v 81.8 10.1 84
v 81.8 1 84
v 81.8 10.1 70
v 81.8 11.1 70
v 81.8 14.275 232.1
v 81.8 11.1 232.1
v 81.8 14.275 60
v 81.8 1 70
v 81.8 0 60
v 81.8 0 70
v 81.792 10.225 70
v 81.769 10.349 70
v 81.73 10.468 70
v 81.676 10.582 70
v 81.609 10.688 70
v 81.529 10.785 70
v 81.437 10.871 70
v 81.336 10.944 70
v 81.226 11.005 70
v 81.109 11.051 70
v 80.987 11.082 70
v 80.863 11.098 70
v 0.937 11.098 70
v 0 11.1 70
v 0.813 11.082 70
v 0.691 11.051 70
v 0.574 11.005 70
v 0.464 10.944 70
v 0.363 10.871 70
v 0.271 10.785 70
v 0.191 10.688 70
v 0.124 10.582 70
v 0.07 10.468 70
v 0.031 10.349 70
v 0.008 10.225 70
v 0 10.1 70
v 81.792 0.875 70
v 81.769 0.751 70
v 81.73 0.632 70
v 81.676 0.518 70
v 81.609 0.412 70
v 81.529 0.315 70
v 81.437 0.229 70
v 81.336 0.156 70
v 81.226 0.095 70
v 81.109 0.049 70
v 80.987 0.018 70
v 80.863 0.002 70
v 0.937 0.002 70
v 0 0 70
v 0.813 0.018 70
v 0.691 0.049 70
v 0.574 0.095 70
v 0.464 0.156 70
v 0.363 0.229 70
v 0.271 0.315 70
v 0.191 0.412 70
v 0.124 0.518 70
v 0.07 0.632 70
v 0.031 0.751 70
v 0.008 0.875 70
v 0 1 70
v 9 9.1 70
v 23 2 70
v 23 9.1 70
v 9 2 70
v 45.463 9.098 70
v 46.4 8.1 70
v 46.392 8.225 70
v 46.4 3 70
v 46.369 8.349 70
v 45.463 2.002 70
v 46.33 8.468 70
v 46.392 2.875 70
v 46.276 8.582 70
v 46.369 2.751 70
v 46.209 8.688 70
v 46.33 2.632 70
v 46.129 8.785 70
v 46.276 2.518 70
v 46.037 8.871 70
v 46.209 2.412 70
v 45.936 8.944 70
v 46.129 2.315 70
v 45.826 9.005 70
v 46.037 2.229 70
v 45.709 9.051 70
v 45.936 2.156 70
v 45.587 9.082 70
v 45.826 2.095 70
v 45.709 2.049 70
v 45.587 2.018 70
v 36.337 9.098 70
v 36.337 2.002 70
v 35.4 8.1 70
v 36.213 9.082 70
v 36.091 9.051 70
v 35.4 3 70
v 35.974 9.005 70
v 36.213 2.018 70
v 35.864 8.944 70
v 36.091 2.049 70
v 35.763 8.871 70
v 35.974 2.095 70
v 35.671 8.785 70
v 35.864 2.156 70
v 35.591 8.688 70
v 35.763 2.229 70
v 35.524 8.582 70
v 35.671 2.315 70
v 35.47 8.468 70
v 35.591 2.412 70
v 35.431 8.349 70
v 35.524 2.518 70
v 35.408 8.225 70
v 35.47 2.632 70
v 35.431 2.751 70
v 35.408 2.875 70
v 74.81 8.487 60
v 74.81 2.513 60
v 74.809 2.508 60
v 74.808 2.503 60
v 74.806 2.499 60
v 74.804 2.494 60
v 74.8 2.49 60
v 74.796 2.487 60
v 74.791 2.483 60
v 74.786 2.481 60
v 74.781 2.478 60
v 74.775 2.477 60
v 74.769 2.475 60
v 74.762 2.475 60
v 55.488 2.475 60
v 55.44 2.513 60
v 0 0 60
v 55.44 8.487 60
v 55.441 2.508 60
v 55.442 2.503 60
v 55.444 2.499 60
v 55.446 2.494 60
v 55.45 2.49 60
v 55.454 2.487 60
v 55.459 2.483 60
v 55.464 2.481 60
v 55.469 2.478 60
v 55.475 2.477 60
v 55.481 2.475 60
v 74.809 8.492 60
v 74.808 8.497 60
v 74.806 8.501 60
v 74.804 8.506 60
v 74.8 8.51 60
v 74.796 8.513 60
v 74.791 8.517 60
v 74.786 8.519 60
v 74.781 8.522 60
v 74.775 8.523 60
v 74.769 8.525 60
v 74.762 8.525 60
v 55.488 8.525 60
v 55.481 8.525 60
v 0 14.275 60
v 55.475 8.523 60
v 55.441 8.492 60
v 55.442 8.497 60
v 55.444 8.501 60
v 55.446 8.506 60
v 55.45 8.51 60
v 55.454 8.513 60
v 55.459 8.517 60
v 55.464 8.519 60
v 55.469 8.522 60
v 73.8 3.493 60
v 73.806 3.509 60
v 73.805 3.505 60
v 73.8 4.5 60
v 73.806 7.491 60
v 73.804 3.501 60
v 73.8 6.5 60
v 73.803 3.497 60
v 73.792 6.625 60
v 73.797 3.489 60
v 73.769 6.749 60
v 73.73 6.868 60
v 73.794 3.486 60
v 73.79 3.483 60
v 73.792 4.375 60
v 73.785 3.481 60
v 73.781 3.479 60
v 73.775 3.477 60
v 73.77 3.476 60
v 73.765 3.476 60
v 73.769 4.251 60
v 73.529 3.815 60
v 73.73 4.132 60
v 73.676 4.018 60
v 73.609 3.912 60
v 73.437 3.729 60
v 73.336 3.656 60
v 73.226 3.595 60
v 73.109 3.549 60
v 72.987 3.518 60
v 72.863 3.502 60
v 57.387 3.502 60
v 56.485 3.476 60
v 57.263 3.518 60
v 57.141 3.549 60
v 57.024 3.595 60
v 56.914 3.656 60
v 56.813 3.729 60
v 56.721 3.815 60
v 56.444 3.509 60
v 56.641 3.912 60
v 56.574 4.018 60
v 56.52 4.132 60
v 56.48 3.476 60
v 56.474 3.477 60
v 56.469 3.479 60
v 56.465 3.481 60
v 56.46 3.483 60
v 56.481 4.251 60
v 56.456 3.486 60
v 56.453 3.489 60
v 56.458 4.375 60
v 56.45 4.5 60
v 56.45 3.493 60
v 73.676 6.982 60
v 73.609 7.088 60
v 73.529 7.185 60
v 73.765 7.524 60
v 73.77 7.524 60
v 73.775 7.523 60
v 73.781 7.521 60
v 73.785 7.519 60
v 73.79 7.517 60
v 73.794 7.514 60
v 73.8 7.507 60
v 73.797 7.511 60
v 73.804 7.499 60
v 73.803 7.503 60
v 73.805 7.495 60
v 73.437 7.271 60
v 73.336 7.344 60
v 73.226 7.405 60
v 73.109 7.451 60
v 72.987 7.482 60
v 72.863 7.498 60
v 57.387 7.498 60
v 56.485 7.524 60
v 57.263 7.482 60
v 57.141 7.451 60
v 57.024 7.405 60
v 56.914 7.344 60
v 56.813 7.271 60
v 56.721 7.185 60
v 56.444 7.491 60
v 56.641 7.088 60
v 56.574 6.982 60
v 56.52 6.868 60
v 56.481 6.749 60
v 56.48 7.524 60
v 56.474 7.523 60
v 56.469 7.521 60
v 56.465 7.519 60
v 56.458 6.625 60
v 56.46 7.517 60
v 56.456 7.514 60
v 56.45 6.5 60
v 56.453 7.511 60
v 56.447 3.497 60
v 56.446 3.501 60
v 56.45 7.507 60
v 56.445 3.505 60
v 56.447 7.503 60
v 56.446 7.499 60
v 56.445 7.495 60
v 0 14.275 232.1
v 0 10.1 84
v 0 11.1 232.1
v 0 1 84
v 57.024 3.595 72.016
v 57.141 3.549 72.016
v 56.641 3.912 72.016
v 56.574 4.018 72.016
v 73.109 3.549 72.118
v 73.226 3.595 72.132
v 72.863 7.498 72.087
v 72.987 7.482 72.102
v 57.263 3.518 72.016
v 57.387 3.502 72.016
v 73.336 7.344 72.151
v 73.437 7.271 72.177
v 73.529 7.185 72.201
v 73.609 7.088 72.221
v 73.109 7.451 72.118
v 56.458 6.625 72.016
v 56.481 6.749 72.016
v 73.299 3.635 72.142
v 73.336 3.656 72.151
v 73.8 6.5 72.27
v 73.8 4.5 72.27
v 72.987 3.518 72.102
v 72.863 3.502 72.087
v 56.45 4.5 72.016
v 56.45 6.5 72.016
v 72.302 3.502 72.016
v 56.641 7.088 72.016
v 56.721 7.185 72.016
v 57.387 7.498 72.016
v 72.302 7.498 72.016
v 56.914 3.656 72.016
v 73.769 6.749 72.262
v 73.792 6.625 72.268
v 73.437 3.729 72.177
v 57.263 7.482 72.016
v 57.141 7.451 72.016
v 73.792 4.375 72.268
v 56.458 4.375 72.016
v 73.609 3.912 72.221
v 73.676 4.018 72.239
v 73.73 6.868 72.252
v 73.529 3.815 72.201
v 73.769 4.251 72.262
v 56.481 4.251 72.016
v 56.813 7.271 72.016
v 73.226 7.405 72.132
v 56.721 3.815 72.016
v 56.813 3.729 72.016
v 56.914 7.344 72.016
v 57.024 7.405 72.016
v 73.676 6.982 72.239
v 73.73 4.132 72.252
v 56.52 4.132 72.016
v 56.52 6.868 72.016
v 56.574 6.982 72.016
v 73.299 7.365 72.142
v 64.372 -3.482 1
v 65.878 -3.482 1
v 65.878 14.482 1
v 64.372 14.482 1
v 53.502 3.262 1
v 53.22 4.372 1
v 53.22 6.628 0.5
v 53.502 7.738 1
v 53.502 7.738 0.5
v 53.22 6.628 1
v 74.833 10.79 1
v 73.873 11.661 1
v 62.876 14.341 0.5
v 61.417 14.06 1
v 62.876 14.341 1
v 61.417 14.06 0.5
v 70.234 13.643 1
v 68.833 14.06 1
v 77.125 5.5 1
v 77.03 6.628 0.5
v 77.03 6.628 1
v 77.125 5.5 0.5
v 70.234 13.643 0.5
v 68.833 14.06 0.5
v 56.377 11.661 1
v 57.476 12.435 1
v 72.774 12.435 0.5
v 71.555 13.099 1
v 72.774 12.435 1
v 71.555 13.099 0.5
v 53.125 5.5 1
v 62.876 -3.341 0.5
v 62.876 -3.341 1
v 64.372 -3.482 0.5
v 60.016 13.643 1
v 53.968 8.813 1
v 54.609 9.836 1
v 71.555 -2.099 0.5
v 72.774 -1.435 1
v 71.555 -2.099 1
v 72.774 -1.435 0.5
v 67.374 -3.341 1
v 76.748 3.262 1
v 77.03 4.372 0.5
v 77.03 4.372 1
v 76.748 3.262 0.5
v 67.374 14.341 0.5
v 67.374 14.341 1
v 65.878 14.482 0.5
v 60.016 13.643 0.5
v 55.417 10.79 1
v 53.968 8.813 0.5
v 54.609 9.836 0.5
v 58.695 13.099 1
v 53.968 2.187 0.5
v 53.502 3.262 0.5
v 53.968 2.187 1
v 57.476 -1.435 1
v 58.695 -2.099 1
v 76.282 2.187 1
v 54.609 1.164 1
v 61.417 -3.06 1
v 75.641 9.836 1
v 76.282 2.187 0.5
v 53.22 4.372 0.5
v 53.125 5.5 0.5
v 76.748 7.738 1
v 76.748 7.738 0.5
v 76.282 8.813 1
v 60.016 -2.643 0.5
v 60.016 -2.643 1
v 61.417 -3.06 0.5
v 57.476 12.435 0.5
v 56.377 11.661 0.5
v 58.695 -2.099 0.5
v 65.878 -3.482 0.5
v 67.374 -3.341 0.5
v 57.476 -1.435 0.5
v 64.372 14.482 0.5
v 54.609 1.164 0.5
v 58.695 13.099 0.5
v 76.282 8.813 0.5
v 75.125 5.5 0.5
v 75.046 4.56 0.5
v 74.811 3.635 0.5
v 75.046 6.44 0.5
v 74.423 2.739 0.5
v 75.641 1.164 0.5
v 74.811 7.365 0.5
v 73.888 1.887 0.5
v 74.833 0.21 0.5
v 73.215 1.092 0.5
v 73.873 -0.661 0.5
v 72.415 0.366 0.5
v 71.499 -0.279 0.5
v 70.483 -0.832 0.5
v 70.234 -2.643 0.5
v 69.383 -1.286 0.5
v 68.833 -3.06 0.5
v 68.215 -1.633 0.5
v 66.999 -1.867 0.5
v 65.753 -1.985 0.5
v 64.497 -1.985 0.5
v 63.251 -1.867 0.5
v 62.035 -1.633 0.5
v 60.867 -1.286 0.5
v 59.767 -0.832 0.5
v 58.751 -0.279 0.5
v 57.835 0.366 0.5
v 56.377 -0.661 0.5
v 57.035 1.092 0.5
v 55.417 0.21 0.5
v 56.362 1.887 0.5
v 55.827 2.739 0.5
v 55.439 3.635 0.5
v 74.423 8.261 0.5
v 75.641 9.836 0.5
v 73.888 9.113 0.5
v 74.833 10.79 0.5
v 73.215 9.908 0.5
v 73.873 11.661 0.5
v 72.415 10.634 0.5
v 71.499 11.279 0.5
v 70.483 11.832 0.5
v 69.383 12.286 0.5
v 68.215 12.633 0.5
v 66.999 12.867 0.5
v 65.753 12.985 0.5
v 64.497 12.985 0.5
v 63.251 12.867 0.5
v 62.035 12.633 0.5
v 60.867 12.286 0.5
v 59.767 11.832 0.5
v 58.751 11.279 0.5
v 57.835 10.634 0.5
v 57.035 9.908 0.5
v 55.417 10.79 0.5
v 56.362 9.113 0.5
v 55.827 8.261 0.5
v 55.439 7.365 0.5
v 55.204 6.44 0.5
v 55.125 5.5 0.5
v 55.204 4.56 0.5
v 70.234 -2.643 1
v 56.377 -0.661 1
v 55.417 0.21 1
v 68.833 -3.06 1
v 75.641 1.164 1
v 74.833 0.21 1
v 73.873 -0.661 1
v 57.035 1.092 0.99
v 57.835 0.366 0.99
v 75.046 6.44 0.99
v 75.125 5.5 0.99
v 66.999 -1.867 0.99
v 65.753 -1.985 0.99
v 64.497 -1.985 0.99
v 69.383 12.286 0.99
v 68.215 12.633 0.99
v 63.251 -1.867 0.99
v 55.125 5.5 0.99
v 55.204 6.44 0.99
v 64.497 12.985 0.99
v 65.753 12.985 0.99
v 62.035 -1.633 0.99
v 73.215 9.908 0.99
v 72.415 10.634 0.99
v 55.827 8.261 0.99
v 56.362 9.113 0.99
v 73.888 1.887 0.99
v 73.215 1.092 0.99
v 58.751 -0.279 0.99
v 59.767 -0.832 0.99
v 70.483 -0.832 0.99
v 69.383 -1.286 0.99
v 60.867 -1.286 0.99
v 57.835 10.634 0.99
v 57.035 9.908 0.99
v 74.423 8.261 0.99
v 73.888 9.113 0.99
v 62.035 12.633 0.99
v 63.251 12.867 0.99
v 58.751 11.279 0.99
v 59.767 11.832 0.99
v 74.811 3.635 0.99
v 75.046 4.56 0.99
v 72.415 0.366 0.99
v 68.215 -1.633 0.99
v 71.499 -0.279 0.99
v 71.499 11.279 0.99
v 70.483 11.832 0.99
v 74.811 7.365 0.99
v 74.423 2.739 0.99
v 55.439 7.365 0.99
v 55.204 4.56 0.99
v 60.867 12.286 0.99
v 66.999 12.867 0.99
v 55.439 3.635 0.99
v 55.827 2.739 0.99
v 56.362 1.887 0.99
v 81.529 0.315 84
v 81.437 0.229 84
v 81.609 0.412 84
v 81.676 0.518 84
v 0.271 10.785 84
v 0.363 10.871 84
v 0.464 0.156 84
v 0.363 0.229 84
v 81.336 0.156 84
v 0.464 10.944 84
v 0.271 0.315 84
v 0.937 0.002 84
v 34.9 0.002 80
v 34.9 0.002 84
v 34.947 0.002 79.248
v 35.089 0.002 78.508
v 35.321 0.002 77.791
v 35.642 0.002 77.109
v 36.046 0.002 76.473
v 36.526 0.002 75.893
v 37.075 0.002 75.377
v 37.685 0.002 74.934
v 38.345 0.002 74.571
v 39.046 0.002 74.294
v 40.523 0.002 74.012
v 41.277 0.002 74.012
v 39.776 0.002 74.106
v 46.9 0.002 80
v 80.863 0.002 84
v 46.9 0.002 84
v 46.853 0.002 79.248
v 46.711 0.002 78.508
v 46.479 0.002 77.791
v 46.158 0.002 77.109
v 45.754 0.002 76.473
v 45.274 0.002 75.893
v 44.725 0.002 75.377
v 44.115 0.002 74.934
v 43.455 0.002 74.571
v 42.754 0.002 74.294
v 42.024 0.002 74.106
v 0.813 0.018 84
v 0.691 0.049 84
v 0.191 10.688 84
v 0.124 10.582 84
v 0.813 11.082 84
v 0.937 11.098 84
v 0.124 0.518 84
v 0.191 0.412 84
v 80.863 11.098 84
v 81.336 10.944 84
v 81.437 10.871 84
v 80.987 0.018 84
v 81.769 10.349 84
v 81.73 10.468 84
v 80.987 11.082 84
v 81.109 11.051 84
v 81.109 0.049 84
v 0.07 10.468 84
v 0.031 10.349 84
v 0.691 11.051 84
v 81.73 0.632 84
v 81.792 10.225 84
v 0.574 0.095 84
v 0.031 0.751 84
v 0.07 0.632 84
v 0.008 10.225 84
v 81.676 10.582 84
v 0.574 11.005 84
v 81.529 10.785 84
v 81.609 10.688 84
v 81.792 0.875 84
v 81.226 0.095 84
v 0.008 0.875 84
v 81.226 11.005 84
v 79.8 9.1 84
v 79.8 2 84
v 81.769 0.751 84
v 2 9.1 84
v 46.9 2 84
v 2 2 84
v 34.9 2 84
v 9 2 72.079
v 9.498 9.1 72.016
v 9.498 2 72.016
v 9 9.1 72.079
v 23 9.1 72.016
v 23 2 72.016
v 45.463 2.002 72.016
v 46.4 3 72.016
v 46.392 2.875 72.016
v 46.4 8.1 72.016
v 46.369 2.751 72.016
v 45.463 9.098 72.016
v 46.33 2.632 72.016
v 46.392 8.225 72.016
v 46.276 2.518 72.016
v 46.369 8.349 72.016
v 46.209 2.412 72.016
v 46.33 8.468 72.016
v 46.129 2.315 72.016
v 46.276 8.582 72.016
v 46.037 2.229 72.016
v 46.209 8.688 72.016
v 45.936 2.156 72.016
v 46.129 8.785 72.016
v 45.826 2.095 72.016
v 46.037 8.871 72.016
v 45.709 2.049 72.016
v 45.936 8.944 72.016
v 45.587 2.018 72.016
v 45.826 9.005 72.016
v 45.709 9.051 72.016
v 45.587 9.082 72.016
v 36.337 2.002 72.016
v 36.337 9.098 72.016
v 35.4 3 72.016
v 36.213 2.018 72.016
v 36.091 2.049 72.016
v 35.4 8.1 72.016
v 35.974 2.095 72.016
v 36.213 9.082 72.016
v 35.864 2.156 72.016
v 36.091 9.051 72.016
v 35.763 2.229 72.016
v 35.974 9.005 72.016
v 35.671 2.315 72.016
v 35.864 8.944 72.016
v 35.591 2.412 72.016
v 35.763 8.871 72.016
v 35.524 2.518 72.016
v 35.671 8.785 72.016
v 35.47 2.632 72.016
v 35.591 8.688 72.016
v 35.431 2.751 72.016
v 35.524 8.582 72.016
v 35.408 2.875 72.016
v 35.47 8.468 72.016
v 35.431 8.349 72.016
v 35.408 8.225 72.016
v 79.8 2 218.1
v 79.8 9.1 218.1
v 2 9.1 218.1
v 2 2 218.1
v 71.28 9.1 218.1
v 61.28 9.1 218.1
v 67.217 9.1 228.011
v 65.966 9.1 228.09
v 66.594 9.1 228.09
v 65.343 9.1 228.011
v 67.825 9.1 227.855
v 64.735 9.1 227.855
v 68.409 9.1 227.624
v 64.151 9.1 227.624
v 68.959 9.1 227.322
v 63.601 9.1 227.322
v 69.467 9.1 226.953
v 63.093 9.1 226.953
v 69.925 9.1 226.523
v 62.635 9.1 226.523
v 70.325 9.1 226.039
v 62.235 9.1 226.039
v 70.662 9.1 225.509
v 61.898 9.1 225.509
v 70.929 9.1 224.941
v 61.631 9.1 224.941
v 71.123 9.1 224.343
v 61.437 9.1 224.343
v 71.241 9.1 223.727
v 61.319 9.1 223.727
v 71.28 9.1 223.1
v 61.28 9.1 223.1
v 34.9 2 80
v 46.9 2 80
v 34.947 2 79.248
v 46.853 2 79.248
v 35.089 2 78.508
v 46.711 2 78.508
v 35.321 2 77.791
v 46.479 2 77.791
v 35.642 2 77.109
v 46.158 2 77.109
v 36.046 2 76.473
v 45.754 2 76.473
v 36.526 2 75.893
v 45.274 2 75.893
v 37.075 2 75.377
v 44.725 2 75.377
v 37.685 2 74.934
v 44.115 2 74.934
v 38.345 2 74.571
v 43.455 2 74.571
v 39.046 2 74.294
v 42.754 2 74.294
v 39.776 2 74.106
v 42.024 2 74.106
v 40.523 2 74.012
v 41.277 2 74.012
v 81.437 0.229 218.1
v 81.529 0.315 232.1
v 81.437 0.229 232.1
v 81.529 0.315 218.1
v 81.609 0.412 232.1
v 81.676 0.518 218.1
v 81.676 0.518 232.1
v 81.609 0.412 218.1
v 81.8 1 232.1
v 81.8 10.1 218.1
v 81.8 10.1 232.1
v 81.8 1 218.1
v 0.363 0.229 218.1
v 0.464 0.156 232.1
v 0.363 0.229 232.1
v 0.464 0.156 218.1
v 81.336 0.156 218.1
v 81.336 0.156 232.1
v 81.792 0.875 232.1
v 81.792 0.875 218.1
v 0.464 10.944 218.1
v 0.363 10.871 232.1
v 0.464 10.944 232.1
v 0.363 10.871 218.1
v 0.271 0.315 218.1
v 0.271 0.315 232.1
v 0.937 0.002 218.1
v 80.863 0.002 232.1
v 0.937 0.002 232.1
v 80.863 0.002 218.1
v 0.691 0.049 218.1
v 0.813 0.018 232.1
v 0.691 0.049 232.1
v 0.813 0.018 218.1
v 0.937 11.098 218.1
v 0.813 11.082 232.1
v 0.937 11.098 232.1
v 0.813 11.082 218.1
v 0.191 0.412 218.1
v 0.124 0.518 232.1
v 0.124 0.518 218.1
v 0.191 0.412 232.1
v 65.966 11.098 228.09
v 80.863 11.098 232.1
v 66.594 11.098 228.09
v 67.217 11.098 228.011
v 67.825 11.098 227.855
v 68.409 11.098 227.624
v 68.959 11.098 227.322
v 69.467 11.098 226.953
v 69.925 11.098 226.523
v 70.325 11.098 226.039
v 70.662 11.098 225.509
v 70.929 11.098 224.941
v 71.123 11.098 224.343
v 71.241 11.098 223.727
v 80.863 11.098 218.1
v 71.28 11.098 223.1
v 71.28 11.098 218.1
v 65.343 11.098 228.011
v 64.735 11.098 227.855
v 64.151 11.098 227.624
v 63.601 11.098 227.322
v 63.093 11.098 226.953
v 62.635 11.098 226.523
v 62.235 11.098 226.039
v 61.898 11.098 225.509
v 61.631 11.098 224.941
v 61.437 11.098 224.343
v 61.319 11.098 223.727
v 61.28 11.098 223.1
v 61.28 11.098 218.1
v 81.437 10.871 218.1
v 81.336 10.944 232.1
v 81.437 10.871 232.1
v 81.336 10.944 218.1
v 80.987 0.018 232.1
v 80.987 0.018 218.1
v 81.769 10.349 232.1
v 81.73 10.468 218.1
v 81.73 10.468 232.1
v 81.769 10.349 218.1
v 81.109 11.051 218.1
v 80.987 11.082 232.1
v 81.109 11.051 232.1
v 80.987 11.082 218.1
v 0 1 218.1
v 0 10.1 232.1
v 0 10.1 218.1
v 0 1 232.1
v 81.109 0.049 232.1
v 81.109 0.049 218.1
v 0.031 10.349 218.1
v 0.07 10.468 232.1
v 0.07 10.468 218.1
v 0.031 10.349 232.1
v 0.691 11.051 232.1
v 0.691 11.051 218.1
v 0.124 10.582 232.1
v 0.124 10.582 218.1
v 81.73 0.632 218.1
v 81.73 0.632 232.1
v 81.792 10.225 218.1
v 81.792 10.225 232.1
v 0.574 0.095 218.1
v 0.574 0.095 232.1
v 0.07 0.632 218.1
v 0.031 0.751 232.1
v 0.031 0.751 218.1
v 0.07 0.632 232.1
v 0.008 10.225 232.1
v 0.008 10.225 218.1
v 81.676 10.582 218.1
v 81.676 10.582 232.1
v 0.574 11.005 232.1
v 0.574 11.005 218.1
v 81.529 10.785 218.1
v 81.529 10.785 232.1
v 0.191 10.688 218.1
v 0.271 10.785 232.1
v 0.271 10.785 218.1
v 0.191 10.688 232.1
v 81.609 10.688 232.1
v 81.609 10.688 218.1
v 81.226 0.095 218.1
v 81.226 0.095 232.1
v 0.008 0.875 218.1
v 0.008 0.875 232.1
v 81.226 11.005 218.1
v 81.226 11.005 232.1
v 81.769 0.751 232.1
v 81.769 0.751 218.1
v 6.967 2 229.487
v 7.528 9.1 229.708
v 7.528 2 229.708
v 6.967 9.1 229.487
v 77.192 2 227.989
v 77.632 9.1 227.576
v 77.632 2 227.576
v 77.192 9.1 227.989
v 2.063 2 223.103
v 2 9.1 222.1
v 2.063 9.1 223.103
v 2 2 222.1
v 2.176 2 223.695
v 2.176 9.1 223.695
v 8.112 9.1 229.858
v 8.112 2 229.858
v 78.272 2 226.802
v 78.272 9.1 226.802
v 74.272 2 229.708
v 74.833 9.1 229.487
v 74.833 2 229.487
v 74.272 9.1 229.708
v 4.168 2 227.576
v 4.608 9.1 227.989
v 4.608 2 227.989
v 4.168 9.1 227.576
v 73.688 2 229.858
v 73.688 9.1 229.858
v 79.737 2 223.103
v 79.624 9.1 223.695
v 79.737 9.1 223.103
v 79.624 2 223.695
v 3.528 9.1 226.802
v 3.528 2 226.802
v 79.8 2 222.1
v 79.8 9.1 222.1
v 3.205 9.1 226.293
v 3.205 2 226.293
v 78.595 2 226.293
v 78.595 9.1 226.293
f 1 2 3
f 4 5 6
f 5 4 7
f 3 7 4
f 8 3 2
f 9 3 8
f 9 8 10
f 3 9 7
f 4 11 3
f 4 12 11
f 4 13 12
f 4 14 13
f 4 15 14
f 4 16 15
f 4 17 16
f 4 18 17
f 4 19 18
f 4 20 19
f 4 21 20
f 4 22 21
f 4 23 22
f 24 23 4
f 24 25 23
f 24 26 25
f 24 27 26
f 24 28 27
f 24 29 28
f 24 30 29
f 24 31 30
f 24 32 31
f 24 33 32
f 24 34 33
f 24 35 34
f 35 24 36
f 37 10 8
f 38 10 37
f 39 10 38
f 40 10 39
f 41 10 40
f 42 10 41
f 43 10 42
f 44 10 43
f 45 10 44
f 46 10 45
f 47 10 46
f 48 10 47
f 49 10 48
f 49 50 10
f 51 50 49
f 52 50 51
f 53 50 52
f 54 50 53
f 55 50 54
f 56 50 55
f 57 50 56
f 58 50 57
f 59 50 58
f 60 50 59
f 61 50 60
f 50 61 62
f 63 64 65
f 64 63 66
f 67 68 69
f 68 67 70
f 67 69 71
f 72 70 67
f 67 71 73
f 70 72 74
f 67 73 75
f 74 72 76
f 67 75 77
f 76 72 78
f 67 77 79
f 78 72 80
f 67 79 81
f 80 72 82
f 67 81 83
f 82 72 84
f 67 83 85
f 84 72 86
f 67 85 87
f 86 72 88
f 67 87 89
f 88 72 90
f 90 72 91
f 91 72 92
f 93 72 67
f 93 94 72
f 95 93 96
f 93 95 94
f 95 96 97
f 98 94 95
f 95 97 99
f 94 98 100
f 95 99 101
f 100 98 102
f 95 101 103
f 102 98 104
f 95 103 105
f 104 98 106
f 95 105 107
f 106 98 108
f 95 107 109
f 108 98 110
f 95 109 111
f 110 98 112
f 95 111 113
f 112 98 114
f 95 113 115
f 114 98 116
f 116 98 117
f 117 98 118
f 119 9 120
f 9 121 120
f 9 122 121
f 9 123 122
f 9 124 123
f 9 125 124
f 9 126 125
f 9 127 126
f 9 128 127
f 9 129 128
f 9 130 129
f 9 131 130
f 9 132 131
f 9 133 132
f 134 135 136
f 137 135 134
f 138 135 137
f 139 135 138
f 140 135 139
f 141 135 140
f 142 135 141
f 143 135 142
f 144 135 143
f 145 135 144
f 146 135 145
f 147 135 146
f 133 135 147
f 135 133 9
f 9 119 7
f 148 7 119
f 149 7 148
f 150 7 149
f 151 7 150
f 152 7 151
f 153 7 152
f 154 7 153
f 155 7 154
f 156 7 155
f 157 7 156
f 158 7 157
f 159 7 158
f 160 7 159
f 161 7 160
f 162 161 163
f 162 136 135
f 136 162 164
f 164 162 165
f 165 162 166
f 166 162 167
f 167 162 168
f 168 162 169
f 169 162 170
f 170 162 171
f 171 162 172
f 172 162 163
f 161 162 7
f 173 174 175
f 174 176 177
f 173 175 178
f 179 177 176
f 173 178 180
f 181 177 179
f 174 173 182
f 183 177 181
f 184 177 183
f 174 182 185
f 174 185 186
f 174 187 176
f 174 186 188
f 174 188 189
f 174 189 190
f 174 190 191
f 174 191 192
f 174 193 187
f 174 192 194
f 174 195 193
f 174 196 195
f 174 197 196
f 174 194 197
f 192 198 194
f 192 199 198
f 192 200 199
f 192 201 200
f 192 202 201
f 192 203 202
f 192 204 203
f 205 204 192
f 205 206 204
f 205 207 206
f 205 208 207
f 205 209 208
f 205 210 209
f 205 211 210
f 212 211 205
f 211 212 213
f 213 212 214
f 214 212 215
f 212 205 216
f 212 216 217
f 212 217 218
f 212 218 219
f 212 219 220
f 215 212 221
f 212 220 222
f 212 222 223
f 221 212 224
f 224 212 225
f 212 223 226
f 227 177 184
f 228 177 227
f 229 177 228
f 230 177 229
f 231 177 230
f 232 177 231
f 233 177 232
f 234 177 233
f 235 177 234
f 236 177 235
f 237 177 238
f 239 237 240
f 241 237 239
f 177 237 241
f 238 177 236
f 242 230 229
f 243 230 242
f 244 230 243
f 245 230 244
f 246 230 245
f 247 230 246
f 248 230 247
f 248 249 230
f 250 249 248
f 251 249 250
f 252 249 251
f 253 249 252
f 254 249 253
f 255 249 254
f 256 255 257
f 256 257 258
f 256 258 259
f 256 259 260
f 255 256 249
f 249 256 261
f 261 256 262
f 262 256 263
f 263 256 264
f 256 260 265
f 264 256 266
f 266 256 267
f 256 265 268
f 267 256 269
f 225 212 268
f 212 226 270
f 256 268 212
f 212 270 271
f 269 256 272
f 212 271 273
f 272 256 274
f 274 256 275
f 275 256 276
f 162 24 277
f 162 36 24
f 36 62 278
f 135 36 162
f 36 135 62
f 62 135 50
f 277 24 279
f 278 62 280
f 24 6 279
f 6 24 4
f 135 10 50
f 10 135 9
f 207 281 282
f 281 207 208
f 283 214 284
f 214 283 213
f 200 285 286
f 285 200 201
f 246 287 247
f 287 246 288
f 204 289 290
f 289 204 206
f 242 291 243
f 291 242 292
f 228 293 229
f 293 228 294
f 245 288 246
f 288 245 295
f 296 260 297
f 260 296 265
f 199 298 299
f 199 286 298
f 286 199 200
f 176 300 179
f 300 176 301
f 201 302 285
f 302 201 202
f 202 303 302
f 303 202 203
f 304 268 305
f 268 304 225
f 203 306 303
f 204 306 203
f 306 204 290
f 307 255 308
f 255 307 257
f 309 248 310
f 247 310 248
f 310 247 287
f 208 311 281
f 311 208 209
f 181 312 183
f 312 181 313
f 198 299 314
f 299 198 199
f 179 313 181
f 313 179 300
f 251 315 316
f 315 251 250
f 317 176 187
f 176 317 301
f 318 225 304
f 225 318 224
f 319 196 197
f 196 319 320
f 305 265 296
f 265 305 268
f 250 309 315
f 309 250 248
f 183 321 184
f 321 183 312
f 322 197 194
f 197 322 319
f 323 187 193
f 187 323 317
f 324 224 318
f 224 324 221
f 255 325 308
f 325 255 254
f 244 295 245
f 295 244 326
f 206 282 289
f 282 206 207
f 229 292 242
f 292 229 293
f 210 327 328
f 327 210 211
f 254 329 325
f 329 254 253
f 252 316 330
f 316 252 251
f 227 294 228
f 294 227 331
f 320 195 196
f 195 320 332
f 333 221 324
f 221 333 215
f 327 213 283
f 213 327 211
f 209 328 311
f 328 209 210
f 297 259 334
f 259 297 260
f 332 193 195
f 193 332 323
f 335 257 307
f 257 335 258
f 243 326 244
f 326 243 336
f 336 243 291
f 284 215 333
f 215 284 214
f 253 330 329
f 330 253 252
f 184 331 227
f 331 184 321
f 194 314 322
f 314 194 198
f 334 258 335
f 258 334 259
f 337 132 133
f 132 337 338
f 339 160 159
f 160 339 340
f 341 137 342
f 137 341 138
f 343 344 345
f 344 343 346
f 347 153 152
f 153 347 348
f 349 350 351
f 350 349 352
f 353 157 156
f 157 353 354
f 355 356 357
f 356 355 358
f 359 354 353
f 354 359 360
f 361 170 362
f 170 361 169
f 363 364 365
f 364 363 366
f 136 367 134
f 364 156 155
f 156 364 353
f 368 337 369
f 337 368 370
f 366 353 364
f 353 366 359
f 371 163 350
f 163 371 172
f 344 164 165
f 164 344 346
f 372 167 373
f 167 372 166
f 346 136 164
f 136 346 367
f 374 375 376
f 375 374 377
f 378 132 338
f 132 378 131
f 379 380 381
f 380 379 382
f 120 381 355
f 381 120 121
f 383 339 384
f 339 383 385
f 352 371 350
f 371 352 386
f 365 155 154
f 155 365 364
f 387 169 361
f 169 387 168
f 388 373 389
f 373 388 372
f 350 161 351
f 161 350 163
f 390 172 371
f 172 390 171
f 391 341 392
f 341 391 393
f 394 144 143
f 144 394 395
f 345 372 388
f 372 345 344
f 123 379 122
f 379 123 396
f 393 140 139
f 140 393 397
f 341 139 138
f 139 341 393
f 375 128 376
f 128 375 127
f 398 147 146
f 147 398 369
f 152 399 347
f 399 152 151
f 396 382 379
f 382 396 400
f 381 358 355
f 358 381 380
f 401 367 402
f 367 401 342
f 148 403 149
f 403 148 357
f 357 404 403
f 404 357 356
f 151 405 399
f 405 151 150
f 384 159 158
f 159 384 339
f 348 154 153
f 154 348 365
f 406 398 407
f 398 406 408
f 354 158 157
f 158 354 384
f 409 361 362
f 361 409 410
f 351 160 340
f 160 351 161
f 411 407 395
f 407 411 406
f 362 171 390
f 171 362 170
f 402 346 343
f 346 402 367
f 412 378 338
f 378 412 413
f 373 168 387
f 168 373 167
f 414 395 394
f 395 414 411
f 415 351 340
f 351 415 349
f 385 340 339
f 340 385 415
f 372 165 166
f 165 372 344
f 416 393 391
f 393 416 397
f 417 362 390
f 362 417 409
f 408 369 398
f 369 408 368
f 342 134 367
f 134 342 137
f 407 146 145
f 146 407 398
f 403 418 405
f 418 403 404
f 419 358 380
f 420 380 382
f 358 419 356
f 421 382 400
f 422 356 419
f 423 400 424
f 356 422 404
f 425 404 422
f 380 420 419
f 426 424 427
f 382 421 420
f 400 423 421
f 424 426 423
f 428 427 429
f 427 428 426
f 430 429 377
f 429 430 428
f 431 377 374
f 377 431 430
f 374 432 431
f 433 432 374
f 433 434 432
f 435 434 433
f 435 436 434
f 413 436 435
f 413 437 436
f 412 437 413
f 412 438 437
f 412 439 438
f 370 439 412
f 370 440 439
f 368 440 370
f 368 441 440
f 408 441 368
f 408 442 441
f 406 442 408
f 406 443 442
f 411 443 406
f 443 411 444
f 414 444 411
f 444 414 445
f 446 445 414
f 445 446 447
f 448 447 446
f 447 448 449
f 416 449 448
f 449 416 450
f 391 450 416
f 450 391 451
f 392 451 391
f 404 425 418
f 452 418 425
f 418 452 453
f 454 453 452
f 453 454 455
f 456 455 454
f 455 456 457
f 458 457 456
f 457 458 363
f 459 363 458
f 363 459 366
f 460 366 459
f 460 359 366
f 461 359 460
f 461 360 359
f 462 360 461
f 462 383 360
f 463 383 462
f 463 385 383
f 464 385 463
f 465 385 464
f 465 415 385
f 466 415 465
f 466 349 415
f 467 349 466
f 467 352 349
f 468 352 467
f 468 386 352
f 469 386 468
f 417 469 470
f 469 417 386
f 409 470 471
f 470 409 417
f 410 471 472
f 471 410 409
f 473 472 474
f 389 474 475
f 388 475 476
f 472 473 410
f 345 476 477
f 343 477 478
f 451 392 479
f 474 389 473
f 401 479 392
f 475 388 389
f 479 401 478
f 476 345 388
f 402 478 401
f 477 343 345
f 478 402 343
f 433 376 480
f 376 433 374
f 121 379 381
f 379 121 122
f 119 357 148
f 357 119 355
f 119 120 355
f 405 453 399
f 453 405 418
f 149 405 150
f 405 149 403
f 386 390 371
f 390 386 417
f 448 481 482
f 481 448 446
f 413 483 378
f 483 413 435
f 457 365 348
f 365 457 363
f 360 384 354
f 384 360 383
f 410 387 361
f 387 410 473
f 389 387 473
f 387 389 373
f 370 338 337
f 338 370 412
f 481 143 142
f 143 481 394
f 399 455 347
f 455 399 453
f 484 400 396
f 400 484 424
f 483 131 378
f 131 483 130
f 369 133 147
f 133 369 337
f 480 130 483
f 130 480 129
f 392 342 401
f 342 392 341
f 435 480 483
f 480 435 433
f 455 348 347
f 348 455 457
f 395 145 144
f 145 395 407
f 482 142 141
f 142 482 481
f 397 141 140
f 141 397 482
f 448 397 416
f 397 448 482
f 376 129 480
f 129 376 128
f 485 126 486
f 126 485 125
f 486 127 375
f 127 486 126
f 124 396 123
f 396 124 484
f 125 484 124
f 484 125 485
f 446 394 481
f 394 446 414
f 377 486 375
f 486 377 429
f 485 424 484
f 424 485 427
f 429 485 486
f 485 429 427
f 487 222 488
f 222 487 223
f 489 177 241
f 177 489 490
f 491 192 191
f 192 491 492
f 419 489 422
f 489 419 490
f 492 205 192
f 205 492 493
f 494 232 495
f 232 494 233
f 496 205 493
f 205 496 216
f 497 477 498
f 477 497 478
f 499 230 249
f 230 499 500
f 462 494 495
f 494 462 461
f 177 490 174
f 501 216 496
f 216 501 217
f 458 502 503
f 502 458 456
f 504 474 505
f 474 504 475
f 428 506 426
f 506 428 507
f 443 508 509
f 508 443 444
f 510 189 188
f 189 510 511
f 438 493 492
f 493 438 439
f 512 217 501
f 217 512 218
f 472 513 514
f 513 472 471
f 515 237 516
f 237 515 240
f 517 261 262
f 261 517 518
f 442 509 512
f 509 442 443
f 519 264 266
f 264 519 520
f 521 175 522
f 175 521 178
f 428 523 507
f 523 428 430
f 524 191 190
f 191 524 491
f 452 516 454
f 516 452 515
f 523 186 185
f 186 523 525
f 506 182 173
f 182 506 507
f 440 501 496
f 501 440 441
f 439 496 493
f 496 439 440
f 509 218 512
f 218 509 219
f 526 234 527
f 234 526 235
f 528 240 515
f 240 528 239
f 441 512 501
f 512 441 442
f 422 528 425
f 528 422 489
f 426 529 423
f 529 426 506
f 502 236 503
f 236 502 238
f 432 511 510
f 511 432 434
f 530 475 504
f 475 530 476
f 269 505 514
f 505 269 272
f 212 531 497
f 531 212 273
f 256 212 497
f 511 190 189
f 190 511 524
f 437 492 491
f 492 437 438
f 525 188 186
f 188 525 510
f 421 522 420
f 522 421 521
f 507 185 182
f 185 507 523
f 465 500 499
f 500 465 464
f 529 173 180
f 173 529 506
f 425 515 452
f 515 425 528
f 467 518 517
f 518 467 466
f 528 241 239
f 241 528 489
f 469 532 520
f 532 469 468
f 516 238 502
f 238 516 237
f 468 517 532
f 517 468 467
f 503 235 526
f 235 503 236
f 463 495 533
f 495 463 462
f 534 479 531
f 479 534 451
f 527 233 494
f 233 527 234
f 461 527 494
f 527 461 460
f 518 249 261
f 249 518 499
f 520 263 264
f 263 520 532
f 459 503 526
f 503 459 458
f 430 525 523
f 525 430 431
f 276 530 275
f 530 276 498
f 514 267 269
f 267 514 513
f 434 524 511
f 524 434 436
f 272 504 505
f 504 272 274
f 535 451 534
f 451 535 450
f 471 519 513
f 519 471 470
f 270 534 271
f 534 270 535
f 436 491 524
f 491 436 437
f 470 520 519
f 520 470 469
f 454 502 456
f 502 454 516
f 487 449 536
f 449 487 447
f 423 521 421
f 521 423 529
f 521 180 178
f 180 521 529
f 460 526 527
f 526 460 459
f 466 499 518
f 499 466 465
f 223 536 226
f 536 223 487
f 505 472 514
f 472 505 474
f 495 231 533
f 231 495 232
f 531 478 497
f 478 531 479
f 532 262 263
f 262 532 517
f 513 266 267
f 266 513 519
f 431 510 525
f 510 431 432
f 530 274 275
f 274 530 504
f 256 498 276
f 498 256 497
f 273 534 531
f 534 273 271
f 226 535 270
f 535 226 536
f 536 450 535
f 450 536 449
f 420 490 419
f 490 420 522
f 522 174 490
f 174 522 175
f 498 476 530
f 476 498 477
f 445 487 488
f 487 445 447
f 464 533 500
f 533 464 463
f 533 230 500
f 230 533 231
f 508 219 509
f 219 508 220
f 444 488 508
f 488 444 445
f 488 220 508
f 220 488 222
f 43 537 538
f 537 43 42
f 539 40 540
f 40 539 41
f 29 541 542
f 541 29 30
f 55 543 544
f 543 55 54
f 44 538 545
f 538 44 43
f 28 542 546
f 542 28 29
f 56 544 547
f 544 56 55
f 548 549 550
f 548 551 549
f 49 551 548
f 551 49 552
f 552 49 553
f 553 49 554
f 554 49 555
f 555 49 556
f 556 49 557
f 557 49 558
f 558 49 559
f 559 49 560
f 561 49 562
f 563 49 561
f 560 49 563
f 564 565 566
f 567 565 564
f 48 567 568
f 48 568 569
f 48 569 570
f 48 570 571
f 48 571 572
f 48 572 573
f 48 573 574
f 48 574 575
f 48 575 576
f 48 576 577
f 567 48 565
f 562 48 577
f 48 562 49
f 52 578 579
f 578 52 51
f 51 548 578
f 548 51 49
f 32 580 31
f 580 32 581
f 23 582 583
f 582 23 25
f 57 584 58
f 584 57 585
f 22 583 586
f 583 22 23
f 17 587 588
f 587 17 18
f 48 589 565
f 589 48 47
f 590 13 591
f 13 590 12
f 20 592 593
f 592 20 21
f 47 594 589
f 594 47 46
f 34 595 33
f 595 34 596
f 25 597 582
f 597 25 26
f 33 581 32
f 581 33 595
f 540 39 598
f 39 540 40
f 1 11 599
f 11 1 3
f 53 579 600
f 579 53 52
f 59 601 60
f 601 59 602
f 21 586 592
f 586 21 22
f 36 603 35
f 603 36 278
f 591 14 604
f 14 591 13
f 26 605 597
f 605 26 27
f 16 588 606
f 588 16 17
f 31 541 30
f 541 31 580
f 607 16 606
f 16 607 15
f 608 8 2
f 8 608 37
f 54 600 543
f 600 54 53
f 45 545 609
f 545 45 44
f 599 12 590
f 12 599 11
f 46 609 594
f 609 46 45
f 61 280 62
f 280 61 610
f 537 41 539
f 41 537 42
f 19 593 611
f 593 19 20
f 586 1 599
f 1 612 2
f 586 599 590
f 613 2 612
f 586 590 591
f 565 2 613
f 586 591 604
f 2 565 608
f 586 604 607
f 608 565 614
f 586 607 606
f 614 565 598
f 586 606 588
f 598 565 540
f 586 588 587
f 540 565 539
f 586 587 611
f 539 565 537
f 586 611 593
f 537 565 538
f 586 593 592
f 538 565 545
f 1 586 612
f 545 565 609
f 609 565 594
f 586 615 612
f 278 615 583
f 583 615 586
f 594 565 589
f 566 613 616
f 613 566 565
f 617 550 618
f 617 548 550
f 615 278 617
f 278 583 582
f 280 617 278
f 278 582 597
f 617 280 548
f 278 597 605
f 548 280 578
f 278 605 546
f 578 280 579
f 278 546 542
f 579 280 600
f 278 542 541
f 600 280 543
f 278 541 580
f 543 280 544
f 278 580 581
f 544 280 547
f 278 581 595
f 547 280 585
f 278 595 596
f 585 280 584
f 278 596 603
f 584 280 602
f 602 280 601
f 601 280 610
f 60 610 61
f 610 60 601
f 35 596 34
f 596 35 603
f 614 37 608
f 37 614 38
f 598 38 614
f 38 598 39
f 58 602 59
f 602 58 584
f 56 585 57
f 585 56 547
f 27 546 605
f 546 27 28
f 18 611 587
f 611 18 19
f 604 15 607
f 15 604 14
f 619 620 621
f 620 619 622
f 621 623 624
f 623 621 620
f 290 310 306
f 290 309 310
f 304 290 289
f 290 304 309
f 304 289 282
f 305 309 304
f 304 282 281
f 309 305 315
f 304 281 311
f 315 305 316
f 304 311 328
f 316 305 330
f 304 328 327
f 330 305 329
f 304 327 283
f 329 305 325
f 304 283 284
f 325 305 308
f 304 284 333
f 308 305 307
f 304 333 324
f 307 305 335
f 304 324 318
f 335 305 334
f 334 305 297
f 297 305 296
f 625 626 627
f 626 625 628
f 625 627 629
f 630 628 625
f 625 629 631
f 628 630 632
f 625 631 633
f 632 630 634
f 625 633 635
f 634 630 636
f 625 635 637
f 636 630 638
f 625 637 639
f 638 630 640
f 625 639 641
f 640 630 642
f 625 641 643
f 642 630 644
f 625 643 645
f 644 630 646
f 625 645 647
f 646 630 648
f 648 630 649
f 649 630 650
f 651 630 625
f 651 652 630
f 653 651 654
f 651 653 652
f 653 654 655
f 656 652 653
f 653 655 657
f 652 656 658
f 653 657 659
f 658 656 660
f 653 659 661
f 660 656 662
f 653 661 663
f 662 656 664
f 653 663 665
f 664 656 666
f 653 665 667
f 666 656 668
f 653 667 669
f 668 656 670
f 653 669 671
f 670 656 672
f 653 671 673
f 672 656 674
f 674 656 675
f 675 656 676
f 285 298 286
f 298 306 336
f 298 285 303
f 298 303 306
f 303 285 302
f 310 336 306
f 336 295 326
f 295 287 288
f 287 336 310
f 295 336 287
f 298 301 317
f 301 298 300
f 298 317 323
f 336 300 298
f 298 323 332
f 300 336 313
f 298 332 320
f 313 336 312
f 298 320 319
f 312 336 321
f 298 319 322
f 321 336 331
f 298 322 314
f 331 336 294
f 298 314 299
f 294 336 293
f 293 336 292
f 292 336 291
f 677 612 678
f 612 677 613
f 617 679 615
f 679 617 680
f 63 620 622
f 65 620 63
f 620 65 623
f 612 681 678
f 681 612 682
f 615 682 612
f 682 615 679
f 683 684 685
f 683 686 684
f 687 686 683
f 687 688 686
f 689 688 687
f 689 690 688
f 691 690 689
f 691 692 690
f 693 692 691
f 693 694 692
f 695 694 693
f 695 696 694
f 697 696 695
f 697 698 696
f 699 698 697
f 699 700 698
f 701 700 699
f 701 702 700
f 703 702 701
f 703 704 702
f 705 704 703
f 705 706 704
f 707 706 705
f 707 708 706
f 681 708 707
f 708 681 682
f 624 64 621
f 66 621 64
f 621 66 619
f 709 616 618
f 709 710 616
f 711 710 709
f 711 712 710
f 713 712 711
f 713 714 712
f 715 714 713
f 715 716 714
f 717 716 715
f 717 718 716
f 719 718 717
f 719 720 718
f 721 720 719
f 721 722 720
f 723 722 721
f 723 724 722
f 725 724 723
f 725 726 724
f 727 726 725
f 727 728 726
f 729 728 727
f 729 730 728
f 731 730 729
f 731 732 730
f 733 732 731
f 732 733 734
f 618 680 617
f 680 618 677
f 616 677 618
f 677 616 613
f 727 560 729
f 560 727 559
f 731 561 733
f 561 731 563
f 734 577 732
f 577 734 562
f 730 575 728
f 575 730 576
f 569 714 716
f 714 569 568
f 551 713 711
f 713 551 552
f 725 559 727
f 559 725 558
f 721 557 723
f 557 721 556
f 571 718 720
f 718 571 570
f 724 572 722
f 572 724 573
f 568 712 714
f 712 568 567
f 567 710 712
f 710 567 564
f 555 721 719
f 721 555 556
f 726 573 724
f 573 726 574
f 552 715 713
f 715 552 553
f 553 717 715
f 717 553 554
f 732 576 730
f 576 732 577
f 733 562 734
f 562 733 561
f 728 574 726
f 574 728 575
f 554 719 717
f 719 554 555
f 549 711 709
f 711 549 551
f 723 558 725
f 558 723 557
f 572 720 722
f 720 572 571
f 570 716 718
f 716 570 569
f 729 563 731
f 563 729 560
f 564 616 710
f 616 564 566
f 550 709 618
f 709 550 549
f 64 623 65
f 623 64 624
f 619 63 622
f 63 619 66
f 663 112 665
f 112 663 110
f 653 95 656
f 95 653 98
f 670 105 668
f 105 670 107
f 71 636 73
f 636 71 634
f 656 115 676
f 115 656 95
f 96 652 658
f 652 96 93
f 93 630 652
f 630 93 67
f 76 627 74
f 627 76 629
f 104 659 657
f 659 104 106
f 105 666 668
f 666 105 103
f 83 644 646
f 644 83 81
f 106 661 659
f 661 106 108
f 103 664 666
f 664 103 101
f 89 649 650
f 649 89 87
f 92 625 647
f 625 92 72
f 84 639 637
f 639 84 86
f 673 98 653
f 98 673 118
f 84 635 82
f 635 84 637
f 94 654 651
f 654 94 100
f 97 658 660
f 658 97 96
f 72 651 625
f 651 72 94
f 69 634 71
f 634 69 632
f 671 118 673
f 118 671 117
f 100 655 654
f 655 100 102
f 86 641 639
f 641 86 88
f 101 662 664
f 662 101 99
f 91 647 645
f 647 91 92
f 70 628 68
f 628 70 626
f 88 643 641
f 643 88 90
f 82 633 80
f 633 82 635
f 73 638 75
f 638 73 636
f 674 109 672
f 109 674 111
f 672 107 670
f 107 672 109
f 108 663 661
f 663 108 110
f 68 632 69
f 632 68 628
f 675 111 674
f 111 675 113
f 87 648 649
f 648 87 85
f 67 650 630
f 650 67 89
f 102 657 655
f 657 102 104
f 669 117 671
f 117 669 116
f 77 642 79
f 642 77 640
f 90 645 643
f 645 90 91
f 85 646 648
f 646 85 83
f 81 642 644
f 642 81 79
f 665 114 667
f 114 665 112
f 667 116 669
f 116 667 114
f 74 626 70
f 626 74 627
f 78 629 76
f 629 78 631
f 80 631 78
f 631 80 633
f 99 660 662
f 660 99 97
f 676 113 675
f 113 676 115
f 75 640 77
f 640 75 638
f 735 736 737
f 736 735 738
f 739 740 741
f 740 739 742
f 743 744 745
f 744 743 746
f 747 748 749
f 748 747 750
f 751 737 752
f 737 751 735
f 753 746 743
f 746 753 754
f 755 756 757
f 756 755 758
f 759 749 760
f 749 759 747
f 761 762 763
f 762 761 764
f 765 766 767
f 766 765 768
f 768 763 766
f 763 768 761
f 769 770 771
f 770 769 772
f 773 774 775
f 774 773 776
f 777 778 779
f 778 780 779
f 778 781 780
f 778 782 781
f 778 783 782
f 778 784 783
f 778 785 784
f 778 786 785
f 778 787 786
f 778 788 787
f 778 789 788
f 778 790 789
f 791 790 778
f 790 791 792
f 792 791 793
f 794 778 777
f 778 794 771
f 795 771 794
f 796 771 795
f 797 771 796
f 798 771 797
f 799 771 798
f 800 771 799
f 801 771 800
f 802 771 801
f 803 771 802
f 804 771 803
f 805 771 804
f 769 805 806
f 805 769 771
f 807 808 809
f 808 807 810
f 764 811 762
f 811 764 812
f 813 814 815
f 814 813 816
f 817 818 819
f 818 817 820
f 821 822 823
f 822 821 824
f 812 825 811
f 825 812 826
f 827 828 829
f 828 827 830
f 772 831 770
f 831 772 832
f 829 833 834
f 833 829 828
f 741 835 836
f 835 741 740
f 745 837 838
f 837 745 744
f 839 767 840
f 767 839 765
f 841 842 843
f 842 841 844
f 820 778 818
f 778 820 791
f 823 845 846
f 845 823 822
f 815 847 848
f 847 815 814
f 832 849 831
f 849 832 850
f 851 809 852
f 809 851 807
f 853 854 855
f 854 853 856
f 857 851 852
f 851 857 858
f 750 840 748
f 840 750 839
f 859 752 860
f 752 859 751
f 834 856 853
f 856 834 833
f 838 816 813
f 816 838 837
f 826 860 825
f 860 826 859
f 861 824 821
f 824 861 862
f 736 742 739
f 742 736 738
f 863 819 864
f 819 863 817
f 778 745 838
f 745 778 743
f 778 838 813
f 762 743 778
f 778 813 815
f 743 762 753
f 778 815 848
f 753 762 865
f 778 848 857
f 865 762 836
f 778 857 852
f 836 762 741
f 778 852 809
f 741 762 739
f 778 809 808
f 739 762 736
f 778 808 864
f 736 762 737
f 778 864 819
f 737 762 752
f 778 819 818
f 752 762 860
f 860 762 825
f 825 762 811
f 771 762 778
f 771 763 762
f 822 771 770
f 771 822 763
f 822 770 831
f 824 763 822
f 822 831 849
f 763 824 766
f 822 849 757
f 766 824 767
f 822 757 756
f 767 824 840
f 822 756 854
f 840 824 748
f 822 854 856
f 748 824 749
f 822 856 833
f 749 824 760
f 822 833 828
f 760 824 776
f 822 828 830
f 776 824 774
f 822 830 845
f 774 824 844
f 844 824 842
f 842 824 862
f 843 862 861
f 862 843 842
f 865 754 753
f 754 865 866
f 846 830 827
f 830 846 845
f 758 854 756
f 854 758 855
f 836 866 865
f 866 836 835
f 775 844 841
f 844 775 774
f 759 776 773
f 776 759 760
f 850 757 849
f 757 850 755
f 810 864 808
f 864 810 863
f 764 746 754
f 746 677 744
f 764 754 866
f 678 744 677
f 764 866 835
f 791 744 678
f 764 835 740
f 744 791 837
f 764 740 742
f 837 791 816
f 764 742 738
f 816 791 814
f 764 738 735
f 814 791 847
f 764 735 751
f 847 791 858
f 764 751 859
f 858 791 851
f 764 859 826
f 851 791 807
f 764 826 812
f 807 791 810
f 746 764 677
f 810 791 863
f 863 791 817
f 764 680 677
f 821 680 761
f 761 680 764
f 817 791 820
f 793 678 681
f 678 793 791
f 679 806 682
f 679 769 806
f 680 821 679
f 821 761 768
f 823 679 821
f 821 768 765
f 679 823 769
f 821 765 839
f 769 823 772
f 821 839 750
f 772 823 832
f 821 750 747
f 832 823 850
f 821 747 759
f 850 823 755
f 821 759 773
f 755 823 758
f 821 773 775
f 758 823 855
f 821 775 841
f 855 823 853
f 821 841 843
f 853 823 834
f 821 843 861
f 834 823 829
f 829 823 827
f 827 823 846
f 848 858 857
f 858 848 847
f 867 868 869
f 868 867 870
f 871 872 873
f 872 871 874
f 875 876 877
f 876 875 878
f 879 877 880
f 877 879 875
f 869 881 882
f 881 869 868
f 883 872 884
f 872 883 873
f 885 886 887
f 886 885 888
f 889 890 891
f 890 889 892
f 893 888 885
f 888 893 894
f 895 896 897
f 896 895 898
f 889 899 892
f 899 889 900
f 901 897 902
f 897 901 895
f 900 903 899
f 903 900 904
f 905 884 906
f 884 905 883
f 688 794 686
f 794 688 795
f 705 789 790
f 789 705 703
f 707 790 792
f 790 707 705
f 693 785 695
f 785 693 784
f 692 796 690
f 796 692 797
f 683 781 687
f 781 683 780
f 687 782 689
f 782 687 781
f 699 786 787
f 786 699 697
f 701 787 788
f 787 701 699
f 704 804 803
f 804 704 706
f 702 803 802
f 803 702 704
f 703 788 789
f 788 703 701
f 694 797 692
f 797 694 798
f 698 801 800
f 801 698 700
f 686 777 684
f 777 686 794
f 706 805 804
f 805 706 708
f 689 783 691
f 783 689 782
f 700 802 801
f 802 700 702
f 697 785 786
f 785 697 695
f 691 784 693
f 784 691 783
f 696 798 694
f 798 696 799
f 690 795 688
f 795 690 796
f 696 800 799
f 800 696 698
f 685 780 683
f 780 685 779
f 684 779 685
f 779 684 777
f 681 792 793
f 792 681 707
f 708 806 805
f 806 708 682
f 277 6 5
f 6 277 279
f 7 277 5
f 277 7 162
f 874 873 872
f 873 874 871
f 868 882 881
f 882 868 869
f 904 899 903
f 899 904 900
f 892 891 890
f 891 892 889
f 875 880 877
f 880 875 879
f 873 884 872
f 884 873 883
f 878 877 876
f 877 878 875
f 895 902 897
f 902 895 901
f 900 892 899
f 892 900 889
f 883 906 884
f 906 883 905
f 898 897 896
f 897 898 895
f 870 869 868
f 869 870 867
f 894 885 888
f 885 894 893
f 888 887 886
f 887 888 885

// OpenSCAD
// file: ../lib/basics.scad
// ## `basics.scad`
// This library contains basic elements to construct mobile device augmentations.

// ### `roundedCube(dimension,edgeRadius)`
// A cube with rounded edges on the depth axis. This function is helpful for creating simple phone shapes.
// #### Where
// * `dimension=[width,depth,height]`: the size of the cube
// * `edgeRadius`: the radius of the rounded edges 
module roundedCube(dimension=[10,10,10],edgeRadius=1){
    translate([0,dimension[1],0])
		rotate([90,0,0])
			hull(){
        		translate([edgeRadius,edgeRadius,0])
					cylinder(r=edgeRadius,h=dimension[1]);
        		translate([dimension[0]-edgeRadius,edgeRadius,0])
					cylinder(r=edgeRadius,h=dimension[1]);
        		translate([edgeRadius,dimension[2]-edgeRadius,0])
					cylinder(r=edgeRadius,h=dimension[1]);
        		translate([dimension[0]-edgeRadius,dimension[2]-edgeRadius,0])
					cylinder(r=edgeRadius,h=dimension[1]);
    		}
}

// ### `bottomHolder(deviceWidth,deviceDepth,deviceEdgeRadius,deviceHeightInHolder,wallThickness,holderEdgeRadius)`
// A basic generic element to hold the bottom part of a device
// #### Where
// * `deviceWidth`: the width of the device to be held
// * `deviceDepth`: the depth of the device to be held
// * `deviceEdgeRadius`: the edge radius of the device to be held
// * `deviceHeightInHolder`: the height of the part of the holder covering the device
// * `wallThickness`: the holder's wall thickness
// * `holderEdgeRadius`: the holder's edge radius
module bottomHolder(deviceWidth=10,deviceDepth=10,deviceEdgeRadius=1,
deviceHeightInHolder=10,wallThickness=1,holderEdgeRadius=1){
	difference(){
		translate([0,deviceDepth+wallThickness*2,0])
			rotate([90,0,0])
				roundedCube([deviceWidth+wallThickness*2,deviceHeightInHolder+wallThickness,
				deviceDepth+wallThickness*2],holderEdgeRadius);
		translate([wallThickness,wallThickness,wallThickness])
			roundedCube([deviceWidth,deviceDepth,
			deviceHeightInHolder+deviceEdgeRadius],deviceEdgeRadius);
	}
}

// ### `topHolder(deviceWidth,deviceDepth,deviceEdgeRadius,deviceHeightInHolder,wallThickness,lipsWidth,holderEdgeRadius)`
// A basic generic element to hold the top part of a device
// #### Where
// * `deviceWidth`: the width of the device to be held
// * `deviceDepth`: the depth of the device to be held
// * `deviceEdgeRadius`: the edge radius of the device to be held
// * `deviceHeightInHolder`: the height of the part of the holder covering the device
// * `wallThickness`: the holder's wall thickness
// * `lipsWidth`: size of the lips holding the device
// * `holderEdgeRadius`: the holder's edge radius
module topHolder(deviceWidth=10,deviceDepth=10,deviceEdgeRadius=1,deviceHeightInHolder=10,
wallThickness=1,lipsWidth=2,holderEdgeRadius=1){
	difference(){
		translate([0,deviceDepth+wallThickness*2,0])rotate([90,0,0])
			roundedCube([deviceWidth+wallThickness*2,deviceHeightInHolder+wallThickness,
			deviceDepth+wallThickness*2],holderEdgeRadius);
		translate([wallThickness,wallThickness,-wallThickness*2])
			roundedCube([deviceWidth,deviceDepth,deviceHeightInHolder],deviceEdgeRadius);
		//translate([wallThickness+lipsWidth,-0.01,-wallThickness-lipsWidth-0.85]) // TODO: 0.85 wrong here: needs to be fixed
		//	roundedCube([deviceWidth-lipsWidth*2,wallThickness+0.02,deviceHeightInHolder],
	//		deviceEdgeRadius*((deviceWidth-lipsWidth*2)/deviceWidth));
	}
}

// ### `rectangleCircularHorn(rectangleWidth,rectangleHeight,circleRadius,hornLength,wallThickness,hornDeformationFactor,hornDerivation,endsHeight)`
// A horn with a square termination on one side and a circle termination on the other.
// #### Where
// * `rectangleWidth`: the width of the rectangular termination
// * `rectangleHeight`: the height of the rectangular termination
// * `circleRadius`: the radius of the circular termination
// * `hornLength`: the length of the horn
// * `wallThickness`: the thickness of the walls
// * `hornDeformationFactor`: controls the vertical flatness of the horn with (1=perfect circle, >1=flatened circle) 
// * `hornDerivation`: displace the position of the circular end relatively to the rectangular end on the horizontal axis
// * `endsHeight`: the height of the two ends
module rectangleCircularHorn(rectangleWidth=10,rectangleHeight=10,circleRadius=10,hornLength=10,wallThickness=1,
hornDeformationFactor=1,hornDerivation=0,endsHeight=0.5){
	difference(){
		hull(){
			cube([rectangleWidth+wallThickness,rectangleHeight+wallThickness,endsHeight],center=true);
			translate([hornDerivation,0,hornLength-endsHeight*2])
				scale([1,hornDeformationFactor,1])
					cylinder(r=circleRadius+wallThickness,h=endsHeight);
		}
		hull(){
			translate([0,0,-0.01])
				cube([rectangleWidth,rectangleHeight,endsHeight],center=true);
			translate([hornDerivation,0,hornLength-endsHeight*2+0.01])
				scale([1,hornDeformationFactor,1])
					cylinder(r=circleRadius,h=endsHeight);
		}
	}
}

// ### `halfSphere(radius)`
// A half sphere useful to create tops.
// #### Where
// * `radius`: the radius of the half sphere
module halfSphere(radius=10){
	difference(){
		translate([radius,radius,0])sphere(radius);
		translate([0,0,-radius*2])cube([radius*2,radius*2,radius*2]);
	}
}

// ### `halfCylinder(dimension=[10,10,10])`
// A half cylinder with controllable height.
// #### Where
// * `dimension=[width,depth,height]`: the size of the half cylinder
module halfCylinder(dimension=[10,10,10]){
	rotate([-90,0,0])scale([1,dimension[2]/dimension[0],1])difference(){
		translate([dimension[0]/2,0,0.01])cylinder(r=dimension[0]/2,h=dimension[1]);
		cube([dimension[0],dimension[0],dimension[1]+0.02]);
	}
}
// main file
include <../lib/iPhone6Plus.scad>

$fn=50;

iPhone6Plus_CaseWithSpeakerMouthPipe();
translate([iPhone6Plus_Module_WallThickness,iPhone6Plus_Module_WallThickness,iPhone6Plus_Module_WallThickness+iPhone6Plus_SpeakerMouthPipe_HornLength+iPhone6Plus_SpeakerMouthPipe_BaseThickness])iPhone6Plus();
